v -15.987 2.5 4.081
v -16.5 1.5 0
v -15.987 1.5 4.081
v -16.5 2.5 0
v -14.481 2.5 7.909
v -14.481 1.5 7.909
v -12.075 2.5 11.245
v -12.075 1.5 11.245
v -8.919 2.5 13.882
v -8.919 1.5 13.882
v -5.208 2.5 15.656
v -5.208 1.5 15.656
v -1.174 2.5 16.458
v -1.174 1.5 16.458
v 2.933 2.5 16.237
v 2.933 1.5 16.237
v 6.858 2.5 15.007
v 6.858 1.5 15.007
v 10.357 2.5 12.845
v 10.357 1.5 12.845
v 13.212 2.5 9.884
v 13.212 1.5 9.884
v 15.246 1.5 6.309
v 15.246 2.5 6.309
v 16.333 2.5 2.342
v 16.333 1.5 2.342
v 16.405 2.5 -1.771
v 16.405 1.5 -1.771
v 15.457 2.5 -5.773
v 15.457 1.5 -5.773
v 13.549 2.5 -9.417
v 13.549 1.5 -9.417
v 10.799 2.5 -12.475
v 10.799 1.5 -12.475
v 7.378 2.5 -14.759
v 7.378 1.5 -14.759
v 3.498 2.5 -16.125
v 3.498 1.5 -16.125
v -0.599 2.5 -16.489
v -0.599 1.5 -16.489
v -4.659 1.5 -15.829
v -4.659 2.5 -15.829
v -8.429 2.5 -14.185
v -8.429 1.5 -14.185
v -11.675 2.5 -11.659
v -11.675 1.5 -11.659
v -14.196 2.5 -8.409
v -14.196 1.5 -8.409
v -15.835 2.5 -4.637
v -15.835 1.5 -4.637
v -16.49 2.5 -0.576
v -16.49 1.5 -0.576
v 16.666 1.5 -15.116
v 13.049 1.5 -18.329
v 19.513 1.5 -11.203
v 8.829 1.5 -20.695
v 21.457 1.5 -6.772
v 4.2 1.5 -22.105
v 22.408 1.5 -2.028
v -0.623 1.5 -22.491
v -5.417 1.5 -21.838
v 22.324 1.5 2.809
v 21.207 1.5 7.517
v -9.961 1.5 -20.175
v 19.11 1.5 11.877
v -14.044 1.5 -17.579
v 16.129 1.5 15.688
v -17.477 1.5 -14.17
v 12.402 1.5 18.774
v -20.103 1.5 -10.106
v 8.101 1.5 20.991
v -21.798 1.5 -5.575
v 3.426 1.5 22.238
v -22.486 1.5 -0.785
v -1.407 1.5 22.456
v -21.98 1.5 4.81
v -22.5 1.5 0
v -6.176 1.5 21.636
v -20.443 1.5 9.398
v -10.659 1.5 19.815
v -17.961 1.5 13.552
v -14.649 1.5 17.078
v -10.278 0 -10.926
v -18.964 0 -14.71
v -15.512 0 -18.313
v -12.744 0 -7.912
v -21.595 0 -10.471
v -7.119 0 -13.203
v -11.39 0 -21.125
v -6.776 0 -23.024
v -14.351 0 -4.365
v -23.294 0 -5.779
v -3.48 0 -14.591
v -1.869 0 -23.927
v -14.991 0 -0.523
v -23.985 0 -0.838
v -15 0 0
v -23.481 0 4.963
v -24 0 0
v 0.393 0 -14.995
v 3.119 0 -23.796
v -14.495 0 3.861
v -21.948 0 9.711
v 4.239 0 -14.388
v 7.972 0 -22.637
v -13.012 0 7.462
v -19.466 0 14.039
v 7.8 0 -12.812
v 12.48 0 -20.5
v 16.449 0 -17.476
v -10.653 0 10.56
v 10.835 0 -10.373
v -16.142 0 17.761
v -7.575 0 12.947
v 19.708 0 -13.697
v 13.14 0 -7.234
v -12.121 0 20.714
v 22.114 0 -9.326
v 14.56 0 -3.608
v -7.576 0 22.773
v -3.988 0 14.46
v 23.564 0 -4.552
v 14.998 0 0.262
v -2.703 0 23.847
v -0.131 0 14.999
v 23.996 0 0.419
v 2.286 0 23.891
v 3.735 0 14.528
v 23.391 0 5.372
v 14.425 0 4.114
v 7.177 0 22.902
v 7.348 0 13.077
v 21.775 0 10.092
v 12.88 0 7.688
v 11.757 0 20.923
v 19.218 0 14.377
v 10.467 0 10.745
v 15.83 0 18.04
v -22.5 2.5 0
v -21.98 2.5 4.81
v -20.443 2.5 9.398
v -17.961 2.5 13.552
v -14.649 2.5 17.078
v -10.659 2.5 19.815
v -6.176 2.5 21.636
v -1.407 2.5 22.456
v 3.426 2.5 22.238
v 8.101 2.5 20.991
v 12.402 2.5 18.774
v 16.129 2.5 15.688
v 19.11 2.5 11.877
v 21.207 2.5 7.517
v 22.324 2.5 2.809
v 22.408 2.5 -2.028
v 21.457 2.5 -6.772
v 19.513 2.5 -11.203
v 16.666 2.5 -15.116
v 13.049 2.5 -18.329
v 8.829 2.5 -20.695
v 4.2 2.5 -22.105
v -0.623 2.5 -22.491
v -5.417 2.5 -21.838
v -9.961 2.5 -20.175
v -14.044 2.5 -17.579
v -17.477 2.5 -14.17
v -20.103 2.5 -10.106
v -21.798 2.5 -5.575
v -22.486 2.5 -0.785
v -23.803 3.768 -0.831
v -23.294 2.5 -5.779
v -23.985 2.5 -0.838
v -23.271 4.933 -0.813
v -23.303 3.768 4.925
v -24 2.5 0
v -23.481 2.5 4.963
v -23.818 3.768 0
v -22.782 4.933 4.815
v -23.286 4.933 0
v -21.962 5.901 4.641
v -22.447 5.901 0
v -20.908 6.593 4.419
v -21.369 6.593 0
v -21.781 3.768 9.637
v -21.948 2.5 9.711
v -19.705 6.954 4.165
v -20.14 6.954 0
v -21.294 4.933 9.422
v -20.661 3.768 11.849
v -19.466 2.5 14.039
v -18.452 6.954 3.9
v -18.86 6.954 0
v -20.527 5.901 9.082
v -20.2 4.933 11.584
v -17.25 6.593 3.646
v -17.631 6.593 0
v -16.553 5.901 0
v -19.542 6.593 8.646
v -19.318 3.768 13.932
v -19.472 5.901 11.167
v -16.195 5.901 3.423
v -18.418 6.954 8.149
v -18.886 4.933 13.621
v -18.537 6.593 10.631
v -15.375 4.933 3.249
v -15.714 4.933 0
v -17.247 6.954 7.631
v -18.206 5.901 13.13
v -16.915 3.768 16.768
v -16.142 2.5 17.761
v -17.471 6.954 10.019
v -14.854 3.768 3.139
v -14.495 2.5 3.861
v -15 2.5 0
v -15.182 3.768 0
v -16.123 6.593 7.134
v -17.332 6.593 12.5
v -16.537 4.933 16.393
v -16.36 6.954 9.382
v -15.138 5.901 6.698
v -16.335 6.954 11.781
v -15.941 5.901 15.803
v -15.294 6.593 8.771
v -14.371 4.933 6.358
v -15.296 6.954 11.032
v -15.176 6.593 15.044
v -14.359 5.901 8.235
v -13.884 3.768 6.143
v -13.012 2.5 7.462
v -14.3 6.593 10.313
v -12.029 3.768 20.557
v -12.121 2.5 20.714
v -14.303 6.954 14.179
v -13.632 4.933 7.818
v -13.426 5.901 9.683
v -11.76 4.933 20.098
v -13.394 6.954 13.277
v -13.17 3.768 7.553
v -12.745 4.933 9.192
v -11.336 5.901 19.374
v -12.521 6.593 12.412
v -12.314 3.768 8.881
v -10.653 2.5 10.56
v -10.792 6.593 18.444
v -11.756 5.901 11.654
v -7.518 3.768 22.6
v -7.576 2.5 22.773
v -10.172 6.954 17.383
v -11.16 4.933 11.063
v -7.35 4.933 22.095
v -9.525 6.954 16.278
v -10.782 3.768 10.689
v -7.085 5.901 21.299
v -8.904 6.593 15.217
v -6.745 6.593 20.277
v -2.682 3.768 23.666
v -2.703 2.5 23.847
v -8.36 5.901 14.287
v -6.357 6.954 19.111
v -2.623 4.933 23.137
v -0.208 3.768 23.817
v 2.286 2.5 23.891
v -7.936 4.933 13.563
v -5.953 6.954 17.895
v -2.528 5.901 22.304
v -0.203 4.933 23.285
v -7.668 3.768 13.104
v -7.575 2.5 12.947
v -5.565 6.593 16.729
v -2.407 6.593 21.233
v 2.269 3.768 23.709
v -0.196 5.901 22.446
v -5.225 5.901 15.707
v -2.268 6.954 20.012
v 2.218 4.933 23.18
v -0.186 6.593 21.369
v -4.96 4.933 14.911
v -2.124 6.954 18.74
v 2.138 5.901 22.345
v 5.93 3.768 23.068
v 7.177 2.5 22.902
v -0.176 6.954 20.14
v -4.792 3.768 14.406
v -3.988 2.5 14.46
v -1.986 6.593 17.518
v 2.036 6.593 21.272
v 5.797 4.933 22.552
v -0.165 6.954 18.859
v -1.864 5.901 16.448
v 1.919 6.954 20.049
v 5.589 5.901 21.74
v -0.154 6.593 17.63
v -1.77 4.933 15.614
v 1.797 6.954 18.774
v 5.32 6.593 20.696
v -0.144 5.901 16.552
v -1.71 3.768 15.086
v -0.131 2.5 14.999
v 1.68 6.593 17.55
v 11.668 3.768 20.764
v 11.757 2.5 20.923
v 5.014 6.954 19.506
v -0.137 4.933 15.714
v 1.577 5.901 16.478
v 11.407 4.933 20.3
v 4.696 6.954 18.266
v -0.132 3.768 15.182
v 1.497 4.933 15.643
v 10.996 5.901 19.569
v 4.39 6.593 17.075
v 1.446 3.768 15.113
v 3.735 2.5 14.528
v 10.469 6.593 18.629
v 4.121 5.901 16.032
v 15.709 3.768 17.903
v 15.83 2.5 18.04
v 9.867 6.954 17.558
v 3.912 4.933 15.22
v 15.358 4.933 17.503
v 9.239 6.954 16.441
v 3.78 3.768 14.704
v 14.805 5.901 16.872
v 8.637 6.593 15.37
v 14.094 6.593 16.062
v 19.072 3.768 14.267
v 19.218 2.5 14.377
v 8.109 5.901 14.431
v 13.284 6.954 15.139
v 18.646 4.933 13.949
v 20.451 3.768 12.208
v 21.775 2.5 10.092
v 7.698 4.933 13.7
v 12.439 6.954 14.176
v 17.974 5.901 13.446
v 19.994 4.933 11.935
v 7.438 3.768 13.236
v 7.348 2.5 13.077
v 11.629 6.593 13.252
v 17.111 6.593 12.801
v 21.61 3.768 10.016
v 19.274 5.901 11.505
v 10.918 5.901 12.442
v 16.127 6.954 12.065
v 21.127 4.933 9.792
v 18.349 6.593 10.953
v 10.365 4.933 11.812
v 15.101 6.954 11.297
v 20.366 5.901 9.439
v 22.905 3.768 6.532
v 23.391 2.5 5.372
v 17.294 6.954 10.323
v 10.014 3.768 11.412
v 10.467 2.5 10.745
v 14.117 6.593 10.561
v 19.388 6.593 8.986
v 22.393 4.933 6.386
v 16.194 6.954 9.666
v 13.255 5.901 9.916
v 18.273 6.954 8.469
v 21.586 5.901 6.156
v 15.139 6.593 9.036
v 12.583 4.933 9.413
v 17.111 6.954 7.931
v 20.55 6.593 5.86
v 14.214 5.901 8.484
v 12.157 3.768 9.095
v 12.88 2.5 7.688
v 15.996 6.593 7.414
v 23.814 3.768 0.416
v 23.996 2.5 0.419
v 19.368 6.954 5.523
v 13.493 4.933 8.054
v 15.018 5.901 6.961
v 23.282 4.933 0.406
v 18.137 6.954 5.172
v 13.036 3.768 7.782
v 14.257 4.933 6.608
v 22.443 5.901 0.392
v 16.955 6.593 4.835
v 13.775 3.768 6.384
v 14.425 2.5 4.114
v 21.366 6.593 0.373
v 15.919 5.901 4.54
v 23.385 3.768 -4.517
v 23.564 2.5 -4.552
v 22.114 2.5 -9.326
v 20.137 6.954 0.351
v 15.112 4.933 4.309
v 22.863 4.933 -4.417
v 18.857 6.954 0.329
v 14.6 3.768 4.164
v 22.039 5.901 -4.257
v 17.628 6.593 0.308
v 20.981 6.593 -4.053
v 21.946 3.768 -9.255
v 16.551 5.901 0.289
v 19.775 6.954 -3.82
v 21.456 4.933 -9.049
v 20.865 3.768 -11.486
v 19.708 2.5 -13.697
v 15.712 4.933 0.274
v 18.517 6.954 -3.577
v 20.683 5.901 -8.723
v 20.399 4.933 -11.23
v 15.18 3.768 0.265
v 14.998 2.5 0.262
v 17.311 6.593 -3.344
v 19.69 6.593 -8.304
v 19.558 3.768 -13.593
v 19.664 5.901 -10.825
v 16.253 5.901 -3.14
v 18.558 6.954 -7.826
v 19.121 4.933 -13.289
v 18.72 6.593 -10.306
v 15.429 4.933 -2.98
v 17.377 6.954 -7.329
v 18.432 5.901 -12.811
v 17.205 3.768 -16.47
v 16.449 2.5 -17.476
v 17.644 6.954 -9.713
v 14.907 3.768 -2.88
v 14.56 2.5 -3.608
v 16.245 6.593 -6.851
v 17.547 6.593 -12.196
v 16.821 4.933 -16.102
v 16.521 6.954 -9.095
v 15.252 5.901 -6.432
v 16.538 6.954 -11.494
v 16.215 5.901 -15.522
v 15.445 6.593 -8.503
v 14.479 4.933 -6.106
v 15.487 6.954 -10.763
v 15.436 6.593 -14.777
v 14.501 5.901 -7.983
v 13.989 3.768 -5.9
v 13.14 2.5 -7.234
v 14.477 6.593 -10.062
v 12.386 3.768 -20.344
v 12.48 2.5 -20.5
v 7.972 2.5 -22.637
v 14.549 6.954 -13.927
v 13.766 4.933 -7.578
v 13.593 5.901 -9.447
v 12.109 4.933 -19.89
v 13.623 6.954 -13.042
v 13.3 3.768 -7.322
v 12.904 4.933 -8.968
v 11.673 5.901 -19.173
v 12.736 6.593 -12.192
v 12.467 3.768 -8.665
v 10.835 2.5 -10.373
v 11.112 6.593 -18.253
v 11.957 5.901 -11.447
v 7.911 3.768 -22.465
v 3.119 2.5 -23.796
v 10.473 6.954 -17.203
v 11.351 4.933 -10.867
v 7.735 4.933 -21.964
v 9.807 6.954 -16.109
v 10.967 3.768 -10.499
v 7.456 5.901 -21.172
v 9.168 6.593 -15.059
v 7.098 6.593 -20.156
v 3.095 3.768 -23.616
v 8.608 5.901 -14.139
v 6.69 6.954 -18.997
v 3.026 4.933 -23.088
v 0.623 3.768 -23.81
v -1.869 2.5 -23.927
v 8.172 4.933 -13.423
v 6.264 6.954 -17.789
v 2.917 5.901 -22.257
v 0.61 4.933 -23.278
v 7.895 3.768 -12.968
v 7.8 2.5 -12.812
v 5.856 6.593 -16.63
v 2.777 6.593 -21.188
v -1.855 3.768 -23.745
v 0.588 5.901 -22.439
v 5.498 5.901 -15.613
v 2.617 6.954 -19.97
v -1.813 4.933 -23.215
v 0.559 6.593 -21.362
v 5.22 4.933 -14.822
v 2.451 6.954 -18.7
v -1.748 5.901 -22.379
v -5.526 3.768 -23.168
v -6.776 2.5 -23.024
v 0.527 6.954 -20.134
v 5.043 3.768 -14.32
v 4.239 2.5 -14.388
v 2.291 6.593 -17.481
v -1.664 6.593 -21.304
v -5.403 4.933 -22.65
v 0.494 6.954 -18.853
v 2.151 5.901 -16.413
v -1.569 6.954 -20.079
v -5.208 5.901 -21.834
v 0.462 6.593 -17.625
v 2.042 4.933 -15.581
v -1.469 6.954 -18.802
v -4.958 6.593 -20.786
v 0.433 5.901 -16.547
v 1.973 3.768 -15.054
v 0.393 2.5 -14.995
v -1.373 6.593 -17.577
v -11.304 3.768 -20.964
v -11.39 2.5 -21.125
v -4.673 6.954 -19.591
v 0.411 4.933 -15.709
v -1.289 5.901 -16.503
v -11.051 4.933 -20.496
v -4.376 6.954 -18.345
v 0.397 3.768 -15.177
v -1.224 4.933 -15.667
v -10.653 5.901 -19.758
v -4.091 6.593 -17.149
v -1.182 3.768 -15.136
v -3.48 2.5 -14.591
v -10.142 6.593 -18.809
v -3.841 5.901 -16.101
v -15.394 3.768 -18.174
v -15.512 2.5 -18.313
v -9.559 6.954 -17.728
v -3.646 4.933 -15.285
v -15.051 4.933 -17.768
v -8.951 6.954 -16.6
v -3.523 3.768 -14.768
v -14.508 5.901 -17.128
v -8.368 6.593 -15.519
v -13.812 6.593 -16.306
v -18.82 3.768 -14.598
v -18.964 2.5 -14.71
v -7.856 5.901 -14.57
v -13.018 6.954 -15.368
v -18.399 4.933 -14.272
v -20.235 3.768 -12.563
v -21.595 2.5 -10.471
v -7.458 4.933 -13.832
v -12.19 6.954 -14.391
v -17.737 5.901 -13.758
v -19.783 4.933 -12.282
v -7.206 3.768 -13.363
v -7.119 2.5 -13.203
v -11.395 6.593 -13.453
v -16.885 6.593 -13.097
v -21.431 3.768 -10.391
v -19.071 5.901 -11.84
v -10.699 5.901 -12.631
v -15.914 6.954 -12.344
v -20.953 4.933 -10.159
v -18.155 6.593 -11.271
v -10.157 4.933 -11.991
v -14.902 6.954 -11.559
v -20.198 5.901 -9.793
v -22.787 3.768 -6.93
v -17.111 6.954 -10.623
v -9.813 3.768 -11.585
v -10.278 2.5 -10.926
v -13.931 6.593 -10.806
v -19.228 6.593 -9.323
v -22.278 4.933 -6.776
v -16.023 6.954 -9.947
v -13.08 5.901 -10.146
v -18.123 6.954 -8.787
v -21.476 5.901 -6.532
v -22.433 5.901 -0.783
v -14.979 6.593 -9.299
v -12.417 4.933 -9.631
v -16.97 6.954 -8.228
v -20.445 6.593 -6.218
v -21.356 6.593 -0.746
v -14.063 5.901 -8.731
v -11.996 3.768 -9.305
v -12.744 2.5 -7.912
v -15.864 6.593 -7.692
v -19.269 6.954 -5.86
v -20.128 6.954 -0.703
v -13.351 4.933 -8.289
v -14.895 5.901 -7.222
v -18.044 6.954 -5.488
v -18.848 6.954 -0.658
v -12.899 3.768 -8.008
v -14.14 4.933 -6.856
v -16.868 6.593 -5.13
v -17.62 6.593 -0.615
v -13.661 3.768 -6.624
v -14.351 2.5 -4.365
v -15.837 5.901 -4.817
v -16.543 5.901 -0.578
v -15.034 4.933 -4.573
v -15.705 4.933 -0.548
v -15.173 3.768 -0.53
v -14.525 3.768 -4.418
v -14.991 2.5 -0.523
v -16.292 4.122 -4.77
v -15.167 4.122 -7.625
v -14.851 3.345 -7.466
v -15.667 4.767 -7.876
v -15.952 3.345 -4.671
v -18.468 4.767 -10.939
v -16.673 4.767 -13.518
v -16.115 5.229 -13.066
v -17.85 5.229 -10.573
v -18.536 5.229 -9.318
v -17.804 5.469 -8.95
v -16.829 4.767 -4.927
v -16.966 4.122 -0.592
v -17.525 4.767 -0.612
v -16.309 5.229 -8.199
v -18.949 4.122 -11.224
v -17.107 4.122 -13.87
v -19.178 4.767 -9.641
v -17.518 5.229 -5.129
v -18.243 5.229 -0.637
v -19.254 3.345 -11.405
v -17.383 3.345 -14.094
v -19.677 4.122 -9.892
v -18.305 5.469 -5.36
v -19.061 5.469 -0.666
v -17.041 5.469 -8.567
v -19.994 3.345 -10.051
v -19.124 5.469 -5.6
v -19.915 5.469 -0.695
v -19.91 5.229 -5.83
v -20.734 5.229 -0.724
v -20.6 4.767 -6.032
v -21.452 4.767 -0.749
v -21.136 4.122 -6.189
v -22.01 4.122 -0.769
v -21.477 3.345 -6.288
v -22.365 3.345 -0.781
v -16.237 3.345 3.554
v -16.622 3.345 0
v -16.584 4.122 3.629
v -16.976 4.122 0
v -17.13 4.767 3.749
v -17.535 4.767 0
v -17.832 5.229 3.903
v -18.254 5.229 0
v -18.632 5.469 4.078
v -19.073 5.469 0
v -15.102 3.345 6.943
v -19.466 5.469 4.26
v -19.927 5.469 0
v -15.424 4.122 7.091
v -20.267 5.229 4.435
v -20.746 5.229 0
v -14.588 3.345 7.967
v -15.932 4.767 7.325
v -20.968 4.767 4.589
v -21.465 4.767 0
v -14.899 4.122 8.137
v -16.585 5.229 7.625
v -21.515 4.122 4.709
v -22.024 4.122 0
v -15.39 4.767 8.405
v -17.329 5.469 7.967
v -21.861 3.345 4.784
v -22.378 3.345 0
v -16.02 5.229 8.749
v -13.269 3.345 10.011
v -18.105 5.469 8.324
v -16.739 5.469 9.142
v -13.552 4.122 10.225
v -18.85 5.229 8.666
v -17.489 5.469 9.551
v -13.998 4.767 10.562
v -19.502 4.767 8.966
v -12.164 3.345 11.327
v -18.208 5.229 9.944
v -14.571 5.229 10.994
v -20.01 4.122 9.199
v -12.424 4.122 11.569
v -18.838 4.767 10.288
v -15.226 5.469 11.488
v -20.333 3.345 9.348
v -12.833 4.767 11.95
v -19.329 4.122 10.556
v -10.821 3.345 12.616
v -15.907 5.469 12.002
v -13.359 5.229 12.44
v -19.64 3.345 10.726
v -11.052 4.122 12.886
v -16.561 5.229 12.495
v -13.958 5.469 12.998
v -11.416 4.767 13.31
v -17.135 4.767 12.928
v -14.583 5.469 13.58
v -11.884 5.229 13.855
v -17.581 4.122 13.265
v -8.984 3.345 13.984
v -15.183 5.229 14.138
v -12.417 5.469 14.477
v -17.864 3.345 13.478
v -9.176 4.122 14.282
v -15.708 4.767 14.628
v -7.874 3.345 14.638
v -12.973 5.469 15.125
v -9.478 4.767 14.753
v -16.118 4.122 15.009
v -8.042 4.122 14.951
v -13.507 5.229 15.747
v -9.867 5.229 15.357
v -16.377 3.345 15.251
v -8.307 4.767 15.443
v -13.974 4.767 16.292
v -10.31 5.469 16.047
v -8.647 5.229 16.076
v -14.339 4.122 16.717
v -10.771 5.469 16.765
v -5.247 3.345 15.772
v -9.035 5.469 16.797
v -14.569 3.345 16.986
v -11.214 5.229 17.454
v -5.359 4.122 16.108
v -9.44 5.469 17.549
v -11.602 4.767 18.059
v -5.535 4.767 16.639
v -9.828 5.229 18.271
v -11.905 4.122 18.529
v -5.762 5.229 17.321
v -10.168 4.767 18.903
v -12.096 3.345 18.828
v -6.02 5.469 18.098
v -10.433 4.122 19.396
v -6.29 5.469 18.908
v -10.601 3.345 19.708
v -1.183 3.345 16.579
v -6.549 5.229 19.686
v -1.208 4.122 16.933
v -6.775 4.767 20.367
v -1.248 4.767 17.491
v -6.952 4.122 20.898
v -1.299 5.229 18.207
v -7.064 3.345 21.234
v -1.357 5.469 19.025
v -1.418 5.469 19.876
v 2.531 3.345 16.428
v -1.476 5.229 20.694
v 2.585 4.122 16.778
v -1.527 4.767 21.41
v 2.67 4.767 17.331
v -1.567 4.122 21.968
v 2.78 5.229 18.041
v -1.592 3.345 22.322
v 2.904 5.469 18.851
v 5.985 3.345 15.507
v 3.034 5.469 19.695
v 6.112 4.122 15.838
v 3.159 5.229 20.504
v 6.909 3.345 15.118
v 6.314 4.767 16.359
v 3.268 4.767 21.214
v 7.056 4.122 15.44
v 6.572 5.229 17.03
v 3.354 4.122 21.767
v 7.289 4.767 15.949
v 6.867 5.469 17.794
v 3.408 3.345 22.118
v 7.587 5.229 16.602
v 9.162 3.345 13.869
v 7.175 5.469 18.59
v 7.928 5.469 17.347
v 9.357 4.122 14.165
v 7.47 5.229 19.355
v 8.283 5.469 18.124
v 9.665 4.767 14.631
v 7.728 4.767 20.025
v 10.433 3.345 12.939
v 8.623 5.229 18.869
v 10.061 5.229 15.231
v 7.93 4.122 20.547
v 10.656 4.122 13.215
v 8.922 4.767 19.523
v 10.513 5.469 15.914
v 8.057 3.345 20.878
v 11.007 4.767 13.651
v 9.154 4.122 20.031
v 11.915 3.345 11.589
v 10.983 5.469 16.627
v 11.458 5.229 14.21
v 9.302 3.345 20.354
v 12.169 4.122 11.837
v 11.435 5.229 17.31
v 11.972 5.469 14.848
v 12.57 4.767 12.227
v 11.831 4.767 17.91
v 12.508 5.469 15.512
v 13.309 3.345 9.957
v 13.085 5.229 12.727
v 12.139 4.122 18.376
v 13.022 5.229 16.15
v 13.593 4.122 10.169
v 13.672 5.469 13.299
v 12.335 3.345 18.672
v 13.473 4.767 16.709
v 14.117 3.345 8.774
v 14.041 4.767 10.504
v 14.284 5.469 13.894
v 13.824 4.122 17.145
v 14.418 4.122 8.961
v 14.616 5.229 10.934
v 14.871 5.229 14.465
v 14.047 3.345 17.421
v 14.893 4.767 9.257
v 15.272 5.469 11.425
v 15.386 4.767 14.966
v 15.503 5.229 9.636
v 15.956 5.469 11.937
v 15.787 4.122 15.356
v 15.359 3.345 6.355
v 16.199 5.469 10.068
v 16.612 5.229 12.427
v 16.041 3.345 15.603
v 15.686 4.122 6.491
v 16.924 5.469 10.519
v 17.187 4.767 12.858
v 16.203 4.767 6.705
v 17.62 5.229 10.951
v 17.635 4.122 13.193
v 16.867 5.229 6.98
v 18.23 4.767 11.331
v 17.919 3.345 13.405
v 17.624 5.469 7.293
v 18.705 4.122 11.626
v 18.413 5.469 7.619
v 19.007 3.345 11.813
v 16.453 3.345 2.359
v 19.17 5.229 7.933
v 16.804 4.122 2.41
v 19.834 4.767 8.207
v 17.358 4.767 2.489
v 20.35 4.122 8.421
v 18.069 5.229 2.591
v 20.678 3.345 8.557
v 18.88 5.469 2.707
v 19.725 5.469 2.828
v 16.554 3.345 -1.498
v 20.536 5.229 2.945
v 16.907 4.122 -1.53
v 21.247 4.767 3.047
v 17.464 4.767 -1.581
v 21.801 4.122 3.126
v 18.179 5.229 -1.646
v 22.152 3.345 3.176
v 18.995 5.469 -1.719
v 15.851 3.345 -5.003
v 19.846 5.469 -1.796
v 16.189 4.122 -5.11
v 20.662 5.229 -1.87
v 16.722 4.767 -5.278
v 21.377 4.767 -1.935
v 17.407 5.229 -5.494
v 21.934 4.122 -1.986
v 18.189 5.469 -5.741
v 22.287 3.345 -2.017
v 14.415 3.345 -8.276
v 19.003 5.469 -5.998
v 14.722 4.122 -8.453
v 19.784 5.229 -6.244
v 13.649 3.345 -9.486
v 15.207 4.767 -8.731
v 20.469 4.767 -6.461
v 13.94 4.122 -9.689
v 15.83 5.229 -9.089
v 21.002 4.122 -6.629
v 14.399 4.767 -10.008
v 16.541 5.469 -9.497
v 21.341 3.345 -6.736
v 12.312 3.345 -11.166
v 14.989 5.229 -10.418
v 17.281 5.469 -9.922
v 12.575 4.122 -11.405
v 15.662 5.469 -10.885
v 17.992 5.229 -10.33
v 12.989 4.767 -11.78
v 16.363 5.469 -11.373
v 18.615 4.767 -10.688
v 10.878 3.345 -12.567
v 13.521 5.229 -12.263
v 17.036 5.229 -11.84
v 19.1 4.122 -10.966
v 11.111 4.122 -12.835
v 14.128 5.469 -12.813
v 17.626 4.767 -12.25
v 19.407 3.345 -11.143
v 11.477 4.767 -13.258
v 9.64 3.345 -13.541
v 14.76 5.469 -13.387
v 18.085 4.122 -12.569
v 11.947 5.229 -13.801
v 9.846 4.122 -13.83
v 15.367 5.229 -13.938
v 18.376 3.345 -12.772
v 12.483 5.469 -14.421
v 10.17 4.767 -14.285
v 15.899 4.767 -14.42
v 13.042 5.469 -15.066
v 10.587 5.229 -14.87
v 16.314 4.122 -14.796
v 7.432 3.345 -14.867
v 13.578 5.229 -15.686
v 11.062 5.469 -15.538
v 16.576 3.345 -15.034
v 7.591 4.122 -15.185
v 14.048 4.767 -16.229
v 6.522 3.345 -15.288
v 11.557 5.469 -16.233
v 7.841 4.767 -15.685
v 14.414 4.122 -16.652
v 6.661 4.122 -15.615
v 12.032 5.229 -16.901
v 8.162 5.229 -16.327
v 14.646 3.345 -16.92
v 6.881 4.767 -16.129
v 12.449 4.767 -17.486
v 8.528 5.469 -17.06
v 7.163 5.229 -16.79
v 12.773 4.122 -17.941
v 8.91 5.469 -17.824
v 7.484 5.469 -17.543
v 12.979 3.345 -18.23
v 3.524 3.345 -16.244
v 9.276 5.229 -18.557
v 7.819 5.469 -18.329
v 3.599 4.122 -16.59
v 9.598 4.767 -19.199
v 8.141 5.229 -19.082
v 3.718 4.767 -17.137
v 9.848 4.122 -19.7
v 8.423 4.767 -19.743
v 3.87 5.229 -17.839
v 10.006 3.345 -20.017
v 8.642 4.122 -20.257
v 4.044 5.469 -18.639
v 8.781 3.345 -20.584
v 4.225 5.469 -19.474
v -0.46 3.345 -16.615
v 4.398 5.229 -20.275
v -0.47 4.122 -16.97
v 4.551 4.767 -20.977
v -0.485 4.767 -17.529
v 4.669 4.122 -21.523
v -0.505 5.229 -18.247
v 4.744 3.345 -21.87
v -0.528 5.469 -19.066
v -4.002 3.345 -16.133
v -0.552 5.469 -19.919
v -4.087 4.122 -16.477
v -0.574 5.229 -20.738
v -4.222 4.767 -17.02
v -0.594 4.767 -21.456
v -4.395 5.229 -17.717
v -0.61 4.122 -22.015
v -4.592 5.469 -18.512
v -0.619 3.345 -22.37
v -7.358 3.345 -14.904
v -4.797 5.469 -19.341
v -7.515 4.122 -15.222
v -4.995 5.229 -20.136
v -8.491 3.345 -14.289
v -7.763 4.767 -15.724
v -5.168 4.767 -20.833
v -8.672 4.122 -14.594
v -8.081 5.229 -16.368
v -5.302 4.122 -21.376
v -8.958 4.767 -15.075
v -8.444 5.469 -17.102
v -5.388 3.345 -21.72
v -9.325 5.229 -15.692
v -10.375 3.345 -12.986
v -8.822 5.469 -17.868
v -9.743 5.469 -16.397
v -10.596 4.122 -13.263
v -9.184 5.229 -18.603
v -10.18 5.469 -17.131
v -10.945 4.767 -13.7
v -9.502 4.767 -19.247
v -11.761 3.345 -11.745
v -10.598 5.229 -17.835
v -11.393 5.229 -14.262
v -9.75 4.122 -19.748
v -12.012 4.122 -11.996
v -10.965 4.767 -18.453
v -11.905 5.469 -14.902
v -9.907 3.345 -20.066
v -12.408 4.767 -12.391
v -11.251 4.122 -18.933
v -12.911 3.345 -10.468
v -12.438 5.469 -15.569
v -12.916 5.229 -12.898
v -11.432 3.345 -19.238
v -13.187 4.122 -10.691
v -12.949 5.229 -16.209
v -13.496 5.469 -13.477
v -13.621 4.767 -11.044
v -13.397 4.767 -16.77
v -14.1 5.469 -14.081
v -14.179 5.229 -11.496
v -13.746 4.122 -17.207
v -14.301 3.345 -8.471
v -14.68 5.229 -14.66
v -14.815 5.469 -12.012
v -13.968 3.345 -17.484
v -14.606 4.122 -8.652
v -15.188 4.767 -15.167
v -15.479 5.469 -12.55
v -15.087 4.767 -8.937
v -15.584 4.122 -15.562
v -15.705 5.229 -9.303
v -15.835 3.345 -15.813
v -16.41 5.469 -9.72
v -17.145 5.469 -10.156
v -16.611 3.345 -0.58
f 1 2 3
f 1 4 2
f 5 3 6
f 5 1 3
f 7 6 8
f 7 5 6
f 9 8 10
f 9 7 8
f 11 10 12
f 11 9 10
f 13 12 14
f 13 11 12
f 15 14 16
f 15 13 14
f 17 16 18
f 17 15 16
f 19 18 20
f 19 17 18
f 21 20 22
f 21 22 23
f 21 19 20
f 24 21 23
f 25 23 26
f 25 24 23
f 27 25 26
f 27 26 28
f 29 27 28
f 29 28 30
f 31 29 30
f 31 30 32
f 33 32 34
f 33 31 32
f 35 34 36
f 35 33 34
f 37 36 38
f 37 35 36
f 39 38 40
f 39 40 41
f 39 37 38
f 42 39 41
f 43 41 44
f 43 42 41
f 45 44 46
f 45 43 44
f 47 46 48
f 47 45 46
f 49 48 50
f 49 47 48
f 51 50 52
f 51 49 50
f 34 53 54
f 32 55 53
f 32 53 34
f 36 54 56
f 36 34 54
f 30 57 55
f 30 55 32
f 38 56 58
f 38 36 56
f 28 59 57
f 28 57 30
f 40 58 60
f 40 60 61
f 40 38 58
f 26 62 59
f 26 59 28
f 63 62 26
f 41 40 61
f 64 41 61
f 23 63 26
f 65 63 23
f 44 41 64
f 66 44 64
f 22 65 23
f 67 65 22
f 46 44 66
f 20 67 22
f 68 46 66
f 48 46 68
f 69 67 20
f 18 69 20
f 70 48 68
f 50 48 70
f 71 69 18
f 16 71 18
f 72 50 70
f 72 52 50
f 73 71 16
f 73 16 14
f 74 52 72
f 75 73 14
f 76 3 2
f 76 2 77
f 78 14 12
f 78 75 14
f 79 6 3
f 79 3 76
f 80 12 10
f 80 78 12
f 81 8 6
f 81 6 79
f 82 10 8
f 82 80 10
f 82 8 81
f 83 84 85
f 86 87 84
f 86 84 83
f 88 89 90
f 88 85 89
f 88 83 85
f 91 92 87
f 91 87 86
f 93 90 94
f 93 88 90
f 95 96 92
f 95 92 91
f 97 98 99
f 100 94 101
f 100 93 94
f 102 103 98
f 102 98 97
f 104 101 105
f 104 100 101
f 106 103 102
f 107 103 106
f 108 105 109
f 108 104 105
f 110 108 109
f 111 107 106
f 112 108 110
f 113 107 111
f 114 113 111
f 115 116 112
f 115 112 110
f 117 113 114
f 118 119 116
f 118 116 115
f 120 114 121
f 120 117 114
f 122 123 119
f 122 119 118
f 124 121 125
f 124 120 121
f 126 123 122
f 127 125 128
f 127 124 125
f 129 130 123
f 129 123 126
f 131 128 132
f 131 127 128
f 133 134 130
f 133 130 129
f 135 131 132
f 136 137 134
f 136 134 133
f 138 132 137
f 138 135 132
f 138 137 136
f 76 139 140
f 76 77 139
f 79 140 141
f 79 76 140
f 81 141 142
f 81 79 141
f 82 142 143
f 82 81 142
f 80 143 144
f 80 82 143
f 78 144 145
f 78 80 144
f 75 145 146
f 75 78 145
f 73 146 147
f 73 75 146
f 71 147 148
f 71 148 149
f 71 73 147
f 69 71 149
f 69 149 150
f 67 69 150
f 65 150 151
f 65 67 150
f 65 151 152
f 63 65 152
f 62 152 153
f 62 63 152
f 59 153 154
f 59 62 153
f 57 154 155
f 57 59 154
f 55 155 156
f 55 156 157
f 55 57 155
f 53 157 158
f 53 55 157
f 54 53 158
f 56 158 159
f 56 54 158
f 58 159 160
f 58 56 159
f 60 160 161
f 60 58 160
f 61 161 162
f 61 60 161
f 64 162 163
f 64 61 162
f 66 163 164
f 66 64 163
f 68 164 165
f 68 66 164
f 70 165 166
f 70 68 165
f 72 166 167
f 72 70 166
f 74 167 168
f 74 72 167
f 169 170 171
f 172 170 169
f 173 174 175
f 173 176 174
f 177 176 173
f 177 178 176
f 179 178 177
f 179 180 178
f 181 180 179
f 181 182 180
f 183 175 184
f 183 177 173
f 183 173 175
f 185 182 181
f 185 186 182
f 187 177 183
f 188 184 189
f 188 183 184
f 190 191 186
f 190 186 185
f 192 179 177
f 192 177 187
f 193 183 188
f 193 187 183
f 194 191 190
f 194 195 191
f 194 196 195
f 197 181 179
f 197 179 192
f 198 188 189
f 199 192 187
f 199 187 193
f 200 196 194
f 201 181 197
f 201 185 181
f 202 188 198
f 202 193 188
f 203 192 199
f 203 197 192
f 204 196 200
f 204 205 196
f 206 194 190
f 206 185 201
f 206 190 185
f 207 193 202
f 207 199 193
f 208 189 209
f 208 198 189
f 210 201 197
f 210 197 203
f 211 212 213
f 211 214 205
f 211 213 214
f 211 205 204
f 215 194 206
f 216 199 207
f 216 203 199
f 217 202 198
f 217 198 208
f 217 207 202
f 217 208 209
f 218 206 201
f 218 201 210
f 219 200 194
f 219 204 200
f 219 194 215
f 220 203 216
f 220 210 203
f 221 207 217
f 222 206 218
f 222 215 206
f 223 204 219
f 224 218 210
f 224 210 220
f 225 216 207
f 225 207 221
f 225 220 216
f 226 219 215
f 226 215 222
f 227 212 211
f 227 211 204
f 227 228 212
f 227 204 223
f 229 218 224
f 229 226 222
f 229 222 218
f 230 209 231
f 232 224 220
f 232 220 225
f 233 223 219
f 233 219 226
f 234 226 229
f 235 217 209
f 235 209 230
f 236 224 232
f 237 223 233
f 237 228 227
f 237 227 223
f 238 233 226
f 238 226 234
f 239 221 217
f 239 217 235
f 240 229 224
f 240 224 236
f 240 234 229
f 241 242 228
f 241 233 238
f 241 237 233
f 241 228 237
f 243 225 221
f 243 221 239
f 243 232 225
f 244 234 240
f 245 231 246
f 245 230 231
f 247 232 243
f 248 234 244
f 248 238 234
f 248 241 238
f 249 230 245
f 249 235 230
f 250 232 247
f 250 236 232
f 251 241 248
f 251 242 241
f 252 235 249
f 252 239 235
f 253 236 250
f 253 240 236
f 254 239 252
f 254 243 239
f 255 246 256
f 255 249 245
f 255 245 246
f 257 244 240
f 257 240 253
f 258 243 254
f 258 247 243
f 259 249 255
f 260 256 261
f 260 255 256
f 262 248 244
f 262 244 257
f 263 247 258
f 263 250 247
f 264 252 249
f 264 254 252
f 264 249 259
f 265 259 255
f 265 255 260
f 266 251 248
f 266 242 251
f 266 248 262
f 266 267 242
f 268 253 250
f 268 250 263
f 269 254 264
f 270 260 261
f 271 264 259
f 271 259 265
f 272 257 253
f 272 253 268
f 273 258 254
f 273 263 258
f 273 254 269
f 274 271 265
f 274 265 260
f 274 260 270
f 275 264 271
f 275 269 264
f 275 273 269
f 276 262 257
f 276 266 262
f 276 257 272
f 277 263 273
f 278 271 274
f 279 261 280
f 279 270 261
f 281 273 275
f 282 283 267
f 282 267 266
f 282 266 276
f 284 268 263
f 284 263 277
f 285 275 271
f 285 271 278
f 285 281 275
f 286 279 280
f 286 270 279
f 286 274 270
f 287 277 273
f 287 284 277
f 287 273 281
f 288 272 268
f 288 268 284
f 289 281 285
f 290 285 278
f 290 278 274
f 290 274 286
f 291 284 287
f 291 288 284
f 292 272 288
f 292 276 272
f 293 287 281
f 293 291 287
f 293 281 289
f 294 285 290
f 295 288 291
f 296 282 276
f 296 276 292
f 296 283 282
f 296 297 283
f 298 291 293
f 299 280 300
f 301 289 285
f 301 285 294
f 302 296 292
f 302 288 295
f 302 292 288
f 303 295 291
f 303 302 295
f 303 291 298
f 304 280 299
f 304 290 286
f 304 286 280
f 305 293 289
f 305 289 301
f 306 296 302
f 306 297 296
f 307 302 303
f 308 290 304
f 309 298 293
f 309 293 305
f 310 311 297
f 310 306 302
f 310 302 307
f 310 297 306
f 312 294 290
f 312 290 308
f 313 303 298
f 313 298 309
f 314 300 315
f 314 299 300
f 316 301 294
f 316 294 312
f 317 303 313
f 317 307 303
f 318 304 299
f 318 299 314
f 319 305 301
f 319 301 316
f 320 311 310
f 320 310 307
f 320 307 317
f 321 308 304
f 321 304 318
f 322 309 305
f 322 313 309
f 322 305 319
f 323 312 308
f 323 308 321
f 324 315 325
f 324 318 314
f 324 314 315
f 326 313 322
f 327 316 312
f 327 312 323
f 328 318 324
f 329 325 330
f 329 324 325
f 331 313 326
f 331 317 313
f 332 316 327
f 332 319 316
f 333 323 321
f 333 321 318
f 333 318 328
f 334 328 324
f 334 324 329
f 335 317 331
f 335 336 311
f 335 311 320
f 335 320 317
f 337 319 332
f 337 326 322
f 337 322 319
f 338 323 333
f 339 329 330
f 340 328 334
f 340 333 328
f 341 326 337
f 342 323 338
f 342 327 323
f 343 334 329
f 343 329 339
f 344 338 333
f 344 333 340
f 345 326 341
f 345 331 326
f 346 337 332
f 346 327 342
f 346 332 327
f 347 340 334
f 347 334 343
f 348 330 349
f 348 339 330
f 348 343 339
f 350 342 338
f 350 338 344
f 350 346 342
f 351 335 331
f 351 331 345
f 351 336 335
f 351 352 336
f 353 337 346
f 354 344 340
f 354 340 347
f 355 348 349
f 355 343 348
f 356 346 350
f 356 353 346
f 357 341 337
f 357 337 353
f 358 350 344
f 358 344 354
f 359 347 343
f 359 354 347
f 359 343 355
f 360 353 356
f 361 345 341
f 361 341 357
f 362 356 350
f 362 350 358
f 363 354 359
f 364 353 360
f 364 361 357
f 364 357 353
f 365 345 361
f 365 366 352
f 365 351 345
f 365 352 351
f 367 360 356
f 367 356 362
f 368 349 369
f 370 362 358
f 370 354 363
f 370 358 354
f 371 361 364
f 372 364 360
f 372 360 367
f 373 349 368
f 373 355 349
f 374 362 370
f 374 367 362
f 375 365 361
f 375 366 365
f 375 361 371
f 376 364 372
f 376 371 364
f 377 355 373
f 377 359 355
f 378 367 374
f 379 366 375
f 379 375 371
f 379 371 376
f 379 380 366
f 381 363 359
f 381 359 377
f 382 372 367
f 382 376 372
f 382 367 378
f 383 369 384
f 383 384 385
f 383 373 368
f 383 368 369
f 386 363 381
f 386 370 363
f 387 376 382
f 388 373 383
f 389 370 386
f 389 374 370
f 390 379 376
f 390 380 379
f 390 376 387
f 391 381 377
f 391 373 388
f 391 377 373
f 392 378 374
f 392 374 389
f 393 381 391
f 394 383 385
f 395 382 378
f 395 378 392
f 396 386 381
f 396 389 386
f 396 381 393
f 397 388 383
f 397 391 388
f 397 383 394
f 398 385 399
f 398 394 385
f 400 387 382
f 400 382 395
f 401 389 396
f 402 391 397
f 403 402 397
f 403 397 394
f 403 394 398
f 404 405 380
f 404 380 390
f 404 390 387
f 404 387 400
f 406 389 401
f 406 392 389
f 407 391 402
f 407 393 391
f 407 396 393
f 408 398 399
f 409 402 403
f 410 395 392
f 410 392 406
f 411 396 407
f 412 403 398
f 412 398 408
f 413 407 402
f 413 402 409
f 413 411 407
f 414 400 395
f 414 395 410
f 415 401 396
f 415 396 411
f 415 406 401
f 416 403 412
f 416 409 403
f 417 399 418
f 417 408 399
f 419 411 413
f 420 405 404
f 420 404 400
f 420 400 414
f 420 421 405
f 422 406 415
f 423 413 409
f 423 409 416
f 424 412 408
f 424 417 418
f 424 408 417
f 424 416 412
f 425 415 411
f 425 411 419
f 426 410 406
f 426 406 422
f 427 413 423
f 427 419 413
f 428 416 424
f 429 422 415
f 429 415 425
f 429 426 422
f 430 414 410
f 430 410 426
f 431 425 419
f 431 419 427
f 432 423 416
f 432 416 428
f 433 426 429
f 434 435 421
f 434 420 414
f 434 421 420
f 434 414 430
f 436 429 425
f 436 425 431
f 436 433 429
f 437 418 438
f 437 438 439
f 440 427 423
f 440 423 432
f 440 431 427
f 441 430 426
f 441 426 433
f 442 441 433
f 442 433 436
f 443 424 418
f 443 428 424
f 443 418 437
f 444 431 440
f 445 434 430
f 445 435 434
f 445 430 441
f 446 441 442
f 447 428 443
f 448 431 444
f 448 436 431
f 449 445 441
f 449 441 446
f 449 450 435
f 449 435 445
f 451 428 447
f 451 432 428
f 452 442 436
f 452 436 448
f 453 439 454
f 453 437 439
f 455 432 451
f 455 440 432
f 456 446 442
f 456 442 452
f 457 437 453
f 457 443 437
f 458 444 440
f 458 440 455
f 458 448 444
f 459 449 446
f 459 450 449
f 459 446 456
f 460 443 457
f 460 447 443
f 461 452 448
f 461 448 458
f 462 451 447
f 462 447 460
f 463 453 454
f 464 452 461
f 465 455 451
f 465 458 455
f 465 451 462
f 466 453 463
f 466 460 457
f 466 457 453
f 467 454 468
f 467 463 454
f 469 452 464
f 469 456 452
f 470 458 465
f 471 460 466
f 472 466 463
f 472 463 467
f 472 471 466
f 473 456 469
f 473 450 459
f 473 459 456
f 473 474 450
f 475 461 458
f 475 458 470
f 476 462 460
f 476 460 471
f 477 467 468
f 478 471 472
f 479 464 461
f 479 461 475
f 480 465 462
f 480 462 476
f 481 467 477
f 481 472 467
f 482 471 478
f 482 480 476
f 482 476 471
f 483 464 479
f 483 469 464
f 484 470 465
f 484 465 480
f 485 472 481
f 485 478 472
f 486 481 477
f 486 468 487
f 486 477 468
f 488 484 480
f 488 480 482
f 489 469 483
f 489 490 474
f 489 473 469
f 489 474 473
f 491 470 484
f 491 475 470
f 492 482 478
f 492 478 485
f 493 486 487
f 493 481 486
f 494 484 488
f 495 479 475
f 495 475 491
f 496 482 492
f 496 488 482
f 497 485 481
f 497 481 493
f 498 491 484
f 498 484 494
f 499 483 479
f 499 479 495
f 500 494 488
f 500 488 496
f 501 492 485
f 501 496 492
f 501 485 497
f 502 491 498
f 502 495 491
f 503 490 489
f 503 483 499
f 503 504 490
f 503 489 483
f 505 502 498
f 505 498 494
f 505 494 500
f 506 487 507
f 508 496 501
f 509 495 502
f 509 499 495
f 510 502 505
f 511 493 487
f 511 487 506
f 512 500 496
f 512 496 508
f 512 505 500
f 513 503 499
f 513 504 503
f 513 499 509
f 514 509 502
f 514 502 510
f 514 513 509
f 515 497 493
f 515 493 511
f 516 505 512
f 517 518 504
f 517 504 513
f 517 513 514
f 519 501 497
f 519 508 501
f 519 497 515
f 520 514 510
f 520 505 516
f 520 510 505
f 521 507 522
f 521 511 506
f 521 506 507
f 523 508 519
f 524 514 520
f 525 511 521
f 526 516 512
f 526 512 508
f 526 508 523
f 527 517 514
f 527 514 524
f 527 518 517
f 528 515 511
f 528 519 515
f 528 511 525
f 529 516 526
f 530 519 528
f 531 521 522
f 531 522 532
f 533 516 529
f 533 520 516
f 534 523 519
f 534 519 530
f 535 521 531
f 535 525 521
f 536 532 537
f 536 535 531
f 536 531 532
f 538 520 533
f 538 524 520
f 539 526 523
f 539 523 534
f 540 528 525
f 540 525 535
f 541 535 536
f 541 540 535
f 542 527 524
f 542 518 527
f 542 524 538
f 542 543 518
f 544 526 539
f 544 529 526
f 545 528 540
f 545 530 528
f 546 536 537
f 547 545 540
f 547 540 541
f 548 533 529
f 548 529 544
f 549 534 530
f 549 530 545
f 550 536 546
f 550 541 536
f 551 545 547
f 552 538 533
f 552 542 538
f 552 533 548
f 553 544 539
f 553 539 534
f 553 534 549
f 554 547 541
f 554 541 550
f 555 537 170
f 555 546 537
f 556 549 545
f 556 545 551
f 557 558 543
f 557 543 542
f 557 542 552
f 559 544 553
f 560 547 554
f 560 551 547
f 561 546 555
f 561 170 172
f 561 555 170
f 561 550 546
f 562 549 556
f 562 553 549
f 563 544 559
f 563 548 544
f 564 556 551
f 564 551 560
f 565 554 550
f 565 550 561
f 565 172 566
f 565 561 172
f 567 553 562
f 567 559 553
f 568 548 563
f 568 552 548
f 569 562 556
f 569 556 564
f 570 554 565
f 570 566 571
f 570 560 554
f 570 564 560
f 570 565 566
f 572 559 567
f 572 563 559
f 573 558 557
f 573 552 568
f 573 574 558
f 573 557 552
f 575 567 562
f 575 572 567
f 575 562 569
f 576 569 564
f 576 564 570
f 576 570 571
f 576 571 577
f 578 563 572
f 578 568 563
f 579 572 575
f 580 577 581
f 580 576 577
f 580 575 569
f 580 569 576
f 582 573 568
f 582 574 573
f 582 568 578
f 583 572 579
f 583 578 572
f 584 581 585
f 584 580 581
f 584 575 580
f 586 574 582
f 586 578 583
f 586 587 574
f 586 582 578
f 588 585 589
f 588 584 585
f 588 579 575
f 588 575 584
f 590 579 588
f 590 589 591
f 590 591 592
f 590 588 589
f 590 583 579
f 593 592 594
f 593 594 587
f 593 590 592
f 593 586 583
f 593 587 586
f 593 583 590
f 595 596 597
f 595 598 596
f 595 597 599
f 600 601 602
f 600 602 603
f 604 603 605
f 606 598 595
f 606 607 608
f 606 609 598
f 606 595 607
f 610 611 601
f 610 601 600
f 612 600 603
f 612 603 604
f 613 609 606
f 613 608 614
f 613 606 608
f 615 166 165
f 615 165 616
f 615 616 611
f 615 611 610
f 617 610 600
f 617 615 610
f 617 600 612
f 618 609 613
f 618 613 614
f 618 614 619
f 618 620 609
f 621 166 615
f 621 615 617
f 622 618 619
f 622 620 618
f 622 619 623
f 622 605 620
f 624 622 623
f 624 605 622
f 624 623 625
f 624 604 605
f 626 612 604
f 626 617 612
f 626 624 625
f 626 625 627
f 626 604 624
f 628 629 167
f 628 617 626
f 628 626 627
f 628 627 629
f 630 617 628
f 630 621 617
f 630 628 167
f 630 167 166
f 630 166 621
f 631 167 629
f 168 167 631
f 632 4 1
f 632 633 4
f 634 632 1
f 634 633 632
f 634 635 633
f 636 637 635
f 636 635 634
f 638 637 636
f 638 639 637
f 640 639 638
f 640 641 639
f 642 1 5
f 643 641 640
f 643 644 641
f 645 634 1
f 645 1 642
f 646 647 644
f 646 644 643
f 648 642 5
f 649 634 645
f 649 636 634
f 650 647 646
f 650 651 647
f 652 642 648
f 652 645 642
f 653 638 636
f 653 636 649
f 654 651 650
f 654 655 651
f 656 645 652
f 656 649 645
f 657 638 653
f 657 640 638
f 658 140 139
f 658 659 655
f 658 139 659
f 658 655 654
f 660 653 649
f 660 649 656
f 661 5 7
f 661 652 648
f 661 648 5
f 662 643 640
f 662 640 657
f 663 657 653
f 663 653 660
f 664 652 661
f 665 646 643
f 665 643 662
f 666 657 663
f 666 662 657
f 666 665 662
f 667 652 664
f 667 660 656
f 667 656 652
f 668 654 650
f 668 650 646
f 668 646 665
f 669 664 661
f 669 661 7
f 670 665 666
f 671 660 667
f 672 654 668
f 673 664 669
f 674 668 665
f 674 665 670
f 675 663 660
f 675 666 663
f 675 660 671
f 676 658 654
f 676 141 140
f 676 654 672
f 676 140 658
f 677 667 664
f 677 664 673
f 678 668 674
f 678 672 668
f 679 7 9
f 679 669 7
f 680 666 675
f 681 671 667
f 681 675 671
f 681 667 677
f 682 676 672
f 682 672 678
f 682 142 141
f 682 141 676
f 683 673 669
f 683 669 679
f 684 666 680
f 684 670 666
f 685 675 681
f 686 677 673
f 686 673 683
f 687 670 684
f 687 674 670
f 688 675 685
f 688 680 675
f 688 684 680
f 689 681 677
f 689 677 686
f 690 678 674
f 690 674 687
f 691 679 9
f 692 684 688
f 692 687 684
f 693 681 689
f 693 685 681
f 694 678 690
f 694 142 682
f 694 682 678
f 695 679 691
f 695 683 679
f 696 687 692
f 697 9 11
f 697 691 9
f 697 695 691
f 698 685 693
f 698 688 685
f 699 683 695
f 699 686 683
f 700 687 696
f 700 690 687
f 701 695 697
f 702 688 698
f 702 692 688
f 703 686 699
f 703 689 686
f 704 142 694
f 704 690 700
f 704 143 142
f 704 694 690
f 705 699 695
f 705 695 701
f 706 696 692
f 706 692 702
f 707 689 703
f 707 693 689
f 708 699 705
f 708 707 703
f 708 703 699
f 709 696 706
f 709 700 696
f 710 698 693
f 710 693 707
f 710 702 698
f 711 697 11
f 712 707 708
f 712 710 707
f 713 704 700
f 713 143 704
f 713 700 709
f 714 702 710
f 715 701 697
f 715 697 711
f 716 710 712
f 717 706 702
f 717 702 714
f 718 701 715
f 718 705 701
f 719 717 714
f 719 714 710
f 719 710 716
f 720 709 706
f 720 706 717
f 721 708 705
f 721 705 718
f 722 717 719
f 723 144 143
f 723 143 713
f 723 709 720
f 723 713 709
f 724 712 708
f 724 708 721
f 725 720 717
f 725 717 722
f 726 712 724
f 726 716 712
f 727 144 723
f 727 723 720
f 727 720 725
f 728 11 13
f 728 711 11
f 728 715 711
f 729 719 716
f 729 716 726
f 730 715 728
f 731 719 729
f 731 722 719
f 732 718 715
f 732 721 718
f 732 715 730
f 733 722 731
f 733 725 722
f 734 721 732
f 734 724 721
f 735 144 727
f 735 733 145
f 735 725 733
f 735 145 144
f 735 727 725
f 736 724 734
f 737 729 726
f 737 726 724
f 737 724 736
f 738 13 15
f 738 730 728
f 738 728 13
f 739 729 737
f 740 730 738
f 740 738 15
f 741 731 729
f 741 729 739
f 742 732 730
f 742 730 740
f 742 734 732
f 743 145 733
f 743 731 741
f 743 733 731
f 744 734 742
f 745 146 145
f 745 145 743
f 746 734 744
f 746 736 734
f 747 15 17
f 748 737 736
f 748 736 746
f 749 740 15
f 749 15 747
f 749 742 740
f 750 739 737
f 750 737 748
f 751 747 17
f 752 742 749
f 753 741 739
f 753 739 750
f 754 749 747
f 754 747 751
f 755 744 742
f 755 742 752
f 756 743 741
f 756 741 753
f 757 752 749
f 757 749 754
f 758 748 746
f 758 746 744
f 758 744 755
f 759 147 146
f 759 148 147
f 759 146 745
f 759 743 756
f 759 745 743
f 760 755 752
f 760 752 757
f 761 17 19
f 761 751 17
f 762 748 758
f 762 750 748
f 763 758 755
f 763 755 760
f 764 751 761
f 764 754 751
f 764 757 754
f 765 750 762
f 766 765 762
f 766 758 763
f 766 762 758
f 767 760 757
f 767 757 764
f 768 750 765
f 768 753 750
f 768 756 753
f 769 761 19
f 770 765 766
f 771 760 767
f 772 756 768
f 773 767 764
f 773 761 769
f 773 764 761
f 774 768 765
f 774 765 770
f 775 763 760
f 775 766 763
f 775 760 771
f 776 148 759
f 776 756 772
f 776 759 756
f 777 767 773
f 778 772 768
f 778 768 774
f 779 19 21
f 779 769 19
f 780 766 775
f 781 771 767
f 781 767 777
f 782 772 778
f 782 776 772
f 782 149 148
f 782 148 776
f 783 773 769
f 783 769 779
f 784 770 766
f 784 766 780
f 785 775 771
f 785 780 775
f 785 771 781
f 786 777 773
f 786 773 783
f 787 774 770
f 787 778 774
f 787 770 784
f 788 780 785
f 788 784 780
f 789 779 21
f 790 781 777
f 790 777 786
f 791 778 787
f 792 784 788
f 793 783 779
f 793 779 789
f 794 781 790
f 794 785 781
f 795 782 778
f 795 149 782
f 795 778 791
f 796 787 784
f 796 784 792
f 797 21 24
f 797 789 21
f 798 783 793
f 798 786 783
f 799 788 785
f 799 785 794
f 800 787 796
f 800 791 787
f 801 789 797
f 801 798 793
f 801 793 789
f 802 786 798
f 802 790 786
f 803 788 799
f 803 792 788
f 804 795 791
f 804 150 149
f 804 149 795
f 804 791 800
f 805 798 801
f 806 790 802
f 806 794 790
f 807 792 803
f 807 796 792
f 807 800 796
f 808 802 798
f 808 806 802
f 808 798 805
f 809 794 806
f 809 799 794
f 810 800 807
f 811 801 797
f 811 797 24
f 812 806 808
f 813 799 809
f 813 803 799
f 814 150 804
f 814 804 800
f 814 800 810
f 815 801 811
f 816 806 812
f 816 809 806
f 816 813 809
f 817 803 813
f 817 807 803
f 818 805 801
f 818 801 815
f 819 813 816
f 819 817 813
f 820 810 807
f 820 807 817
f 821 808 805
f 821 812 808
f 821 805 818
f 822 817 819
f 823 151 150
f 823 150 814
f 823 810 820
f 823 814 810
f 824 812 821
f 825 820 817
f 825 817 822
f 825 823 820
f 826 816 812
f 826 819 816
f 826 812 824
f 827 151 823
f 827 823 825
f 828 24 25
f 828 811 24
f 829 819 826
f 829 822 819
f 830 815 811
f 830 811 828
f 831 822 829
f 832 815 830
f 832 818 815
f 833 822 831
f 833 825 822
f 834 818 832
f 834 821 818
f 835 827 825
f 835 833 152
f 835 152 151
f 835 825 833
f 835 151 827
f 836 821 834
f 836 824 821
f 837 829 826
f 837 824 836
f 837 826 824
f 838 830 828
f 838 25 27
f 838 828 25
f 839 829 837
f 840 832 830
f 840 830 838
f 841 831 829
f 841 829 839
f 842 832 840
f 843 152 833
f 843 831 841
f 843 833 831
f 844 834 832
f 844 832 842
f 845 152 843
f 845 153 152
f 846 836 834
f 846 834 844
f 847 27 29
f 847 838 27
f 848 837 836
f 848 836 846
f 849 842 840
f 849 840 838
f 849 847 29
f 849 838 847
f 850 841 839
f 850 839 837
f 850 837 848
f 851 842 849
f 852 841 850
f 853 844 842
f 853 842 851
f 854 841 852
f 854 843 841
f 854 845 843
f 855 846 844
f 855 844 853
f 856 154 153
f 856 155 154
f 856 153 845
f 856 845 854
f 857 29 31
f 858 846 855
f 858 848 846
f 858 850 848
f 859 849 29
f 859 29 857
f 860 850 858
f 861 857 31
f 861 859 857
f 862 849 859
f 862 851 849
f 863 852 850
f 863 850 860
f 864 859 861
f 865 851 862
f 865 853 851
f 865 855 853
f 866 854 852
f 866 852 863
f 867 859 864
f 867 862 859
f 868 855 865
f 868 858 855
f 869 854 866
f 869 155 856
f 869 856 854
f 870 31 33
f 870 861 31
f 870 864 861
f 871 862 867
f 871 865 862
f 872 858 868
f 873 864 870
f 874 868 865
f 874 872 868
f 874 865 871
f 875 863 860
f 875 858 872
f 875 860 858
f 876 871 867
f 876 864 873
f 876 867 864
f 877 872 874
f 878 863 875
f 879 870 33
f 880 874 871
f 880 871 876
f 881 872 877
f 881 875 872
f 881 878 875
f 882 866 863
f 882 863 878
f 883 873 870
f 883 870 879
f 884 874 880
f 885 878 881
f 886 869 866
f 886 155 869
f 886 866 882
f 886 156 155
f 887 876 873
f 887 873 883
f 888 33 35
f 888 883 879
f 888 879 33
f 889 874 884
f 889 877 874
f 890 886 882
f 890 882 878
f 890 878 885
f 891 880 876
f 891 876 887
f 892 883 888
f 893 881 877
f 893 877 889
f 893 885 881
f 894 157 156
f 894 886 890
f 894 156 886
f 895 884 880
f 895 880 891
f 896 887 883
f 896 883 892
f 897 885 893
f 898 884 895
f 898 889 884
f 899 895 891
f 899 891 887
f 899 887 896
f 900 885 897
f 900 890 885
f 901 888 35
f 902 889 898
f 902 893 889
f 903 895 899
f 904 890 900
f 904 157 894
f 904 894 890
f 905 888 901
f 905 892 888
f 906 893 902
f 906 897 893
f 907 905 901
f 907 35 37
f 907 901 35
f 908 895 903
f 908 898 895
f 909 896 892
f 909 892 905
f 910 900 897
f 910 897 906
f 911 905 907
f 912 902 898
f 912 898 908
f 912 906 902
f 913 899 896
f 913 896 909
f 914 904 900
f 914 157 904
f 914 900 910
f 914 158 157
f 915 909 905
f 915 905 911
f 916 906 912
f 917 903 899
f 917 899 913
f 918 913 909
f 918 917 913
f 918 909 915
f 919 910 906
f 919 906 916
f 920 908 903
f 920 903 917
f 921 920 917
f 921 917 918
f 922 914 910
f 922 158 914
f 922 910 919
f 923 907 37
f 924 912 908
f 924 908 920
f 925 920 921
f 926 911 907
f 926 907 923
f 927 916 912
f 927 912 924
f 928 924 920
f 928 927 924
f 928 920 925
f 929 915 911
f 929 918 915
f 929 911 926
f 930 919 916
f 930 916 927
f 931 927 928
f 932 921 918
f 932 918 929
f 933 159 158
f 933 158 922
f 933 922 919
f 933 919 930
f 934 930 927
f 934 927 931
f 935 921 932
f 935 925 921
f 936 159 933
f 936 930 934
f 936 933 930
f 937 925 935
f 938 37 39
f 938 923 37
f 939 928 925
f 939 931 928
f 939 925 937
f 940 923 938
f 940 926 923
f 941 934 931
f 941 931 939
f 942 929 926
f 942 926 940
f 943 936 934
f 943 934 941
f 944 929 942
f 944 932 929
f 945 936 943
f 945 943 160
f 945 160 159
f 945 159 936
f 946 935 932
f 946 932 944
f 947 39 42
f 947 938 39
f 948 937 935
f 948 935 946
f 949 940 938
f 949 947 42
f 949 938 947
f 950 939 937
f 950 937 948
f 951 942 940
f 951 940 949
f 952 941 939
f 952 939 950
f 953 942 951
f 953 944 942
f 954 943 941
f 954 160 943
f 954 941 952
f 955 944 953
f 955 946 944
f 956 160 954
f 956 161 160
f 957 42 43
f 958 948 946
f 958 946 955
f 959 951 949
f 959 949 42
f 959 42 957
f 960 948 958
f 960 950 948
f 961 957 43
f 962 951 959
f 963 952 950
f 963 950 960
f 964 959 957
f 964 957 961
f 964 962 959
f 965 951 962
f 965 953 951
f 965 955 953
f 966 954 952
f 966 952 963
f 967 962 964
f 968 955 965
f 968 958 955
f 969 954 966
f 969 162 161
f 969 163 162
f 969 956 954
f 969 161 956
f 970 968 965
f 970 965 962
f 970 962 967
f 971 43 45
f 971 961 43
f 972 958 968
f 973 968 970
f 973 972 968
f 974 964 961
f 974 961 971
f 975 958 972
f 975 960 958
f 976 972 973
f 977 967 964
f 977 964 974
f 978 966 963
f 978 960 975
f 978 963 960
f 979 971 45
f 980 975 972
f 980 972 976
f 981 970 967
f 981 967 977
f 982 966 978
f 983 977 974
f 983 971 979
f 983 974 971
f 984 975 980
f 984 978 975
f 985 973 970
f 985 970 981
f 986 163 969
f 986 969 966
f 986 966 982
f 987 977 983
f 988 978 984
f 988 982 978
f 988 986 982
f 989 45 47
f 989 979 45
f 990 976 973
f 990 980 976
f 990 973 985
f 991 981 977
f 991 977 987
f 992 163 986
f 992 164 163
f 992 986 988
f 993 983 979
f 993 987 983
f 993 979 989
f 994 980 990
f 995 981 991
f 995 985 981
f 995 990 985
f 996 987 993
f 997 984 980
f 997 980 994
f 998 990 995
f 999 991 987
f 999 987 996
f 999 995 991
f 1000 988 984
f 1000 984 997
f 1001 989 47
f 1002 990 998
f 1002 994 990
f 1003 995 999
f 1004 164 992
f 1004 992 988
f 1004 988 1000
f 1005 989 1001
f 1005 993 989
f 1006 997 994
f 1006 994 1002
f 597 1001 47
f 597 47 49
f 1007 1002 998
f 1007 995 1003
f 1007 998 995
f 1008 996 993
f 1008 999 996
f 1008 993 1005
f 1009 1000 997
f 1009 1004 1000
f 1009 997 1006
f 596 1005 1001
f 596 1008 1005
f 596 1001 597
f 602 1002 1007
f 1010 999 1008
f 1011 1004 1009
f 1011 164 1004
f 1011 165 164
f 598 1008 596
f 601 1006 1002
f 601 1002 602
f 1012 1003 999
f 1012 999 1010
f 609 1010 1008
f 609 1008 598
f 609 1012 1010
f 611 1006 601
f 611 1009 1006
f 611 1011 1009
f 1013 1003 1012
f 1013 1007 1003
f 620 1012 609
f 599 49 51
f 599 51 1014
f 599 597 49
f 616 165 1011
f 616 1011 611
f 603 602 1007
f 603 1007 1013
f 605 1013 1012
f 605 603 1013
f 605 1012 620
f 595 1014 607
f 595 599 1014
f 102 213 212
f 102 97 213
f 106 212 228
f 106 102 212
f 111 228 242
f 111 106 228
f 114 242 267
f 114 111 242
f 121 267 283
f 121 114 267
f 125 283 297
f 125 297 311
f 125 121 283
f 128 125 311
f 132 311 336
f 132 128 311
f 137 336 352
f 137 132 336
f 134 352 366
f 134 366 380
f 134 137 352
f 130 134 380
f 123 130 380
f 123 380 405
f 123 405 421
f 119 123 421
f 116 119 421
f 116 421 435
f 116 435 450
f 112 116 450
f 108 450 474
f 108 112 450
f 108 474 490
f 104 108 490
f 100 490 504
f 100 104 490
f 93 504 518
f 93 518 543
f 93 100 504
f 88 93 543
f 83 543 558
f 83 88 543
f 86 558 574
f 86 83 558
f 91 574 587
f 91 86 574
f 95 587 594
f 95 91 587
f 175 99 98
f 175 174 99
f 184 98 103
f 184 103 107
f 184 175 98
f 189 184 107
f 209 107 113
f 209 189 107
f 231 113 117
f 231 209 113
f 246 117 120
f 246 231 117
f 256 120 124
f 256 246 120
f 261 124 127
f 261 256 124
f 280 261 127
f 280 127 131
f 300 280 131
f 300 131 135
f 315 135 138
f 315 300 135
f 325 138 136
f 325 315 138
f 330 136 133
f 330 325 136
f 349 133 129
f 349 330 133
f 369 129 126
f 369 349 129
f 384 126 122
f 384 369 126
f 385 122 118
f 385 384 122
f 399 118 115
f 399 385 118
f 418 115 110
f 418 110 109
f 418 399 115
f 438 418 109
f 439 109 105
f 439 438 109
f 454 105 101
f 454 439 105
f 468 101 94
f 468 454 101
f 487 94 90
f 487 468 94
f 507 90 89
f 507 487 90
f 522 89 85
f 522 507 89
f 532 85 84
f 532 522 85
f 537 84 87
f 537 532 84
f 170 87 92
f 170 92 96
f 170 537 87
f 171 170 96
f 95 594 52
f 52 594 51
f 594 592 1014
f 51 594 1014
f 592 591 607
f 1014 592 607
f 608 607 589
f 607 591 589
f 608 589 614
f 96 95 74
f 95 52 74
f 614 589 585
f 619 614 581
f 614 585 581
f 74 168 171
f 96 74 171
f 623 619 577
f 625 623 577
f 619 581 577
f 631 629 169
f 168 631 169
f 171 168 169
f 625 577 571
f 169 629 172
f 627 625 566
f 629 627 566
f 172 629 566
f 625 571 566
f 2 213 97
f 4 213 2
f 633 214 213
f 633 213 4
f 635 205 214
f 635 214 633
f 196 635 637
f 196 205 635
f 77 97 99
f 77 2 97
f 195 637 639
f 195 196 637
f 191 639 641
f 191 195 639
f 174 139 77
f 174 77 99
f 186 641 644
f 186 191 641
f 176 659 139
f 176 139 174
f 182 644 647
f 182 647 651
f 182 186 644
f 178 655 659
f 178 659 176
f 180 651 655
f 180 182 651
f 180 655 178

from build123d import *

# Parameters (mm, degrees)
REVOLVE1_ANGLE = 358


with BuildPart() as part:
    # Sketch1 → Revolve1 (revolve)
    with BuildSketch(Plane.XY):
        with BuildLine():
            Line((-15, 0), (-24, 0))
            Line((-24, 0), (-24, 2.5))
            ThreePointArc((-24, 2.5), (-19.5, 7), (-15, 2.5))
            Line((-15, 2.5), (-15, 0))
        make_face()
        with BuildLine():
            Line((-16.5, 1.5), (-16.5, 2.5))
            ThreePointArc((-16.5, 2.5), (-19.5, 5.5), (-22.5, 2.5))
            Line((-22.5, 2.5), (-22.5, 1.5))
            Line((-22.5, 1.5), (-16.5, 1.5))
        make_face(mode=Mode.SUBTRACT)
    revolve(axis=Axis((0, 0, 0), (0, 1, 0)), revolution_arc=REVOLVE1_ANGLE)


solid = part.part
